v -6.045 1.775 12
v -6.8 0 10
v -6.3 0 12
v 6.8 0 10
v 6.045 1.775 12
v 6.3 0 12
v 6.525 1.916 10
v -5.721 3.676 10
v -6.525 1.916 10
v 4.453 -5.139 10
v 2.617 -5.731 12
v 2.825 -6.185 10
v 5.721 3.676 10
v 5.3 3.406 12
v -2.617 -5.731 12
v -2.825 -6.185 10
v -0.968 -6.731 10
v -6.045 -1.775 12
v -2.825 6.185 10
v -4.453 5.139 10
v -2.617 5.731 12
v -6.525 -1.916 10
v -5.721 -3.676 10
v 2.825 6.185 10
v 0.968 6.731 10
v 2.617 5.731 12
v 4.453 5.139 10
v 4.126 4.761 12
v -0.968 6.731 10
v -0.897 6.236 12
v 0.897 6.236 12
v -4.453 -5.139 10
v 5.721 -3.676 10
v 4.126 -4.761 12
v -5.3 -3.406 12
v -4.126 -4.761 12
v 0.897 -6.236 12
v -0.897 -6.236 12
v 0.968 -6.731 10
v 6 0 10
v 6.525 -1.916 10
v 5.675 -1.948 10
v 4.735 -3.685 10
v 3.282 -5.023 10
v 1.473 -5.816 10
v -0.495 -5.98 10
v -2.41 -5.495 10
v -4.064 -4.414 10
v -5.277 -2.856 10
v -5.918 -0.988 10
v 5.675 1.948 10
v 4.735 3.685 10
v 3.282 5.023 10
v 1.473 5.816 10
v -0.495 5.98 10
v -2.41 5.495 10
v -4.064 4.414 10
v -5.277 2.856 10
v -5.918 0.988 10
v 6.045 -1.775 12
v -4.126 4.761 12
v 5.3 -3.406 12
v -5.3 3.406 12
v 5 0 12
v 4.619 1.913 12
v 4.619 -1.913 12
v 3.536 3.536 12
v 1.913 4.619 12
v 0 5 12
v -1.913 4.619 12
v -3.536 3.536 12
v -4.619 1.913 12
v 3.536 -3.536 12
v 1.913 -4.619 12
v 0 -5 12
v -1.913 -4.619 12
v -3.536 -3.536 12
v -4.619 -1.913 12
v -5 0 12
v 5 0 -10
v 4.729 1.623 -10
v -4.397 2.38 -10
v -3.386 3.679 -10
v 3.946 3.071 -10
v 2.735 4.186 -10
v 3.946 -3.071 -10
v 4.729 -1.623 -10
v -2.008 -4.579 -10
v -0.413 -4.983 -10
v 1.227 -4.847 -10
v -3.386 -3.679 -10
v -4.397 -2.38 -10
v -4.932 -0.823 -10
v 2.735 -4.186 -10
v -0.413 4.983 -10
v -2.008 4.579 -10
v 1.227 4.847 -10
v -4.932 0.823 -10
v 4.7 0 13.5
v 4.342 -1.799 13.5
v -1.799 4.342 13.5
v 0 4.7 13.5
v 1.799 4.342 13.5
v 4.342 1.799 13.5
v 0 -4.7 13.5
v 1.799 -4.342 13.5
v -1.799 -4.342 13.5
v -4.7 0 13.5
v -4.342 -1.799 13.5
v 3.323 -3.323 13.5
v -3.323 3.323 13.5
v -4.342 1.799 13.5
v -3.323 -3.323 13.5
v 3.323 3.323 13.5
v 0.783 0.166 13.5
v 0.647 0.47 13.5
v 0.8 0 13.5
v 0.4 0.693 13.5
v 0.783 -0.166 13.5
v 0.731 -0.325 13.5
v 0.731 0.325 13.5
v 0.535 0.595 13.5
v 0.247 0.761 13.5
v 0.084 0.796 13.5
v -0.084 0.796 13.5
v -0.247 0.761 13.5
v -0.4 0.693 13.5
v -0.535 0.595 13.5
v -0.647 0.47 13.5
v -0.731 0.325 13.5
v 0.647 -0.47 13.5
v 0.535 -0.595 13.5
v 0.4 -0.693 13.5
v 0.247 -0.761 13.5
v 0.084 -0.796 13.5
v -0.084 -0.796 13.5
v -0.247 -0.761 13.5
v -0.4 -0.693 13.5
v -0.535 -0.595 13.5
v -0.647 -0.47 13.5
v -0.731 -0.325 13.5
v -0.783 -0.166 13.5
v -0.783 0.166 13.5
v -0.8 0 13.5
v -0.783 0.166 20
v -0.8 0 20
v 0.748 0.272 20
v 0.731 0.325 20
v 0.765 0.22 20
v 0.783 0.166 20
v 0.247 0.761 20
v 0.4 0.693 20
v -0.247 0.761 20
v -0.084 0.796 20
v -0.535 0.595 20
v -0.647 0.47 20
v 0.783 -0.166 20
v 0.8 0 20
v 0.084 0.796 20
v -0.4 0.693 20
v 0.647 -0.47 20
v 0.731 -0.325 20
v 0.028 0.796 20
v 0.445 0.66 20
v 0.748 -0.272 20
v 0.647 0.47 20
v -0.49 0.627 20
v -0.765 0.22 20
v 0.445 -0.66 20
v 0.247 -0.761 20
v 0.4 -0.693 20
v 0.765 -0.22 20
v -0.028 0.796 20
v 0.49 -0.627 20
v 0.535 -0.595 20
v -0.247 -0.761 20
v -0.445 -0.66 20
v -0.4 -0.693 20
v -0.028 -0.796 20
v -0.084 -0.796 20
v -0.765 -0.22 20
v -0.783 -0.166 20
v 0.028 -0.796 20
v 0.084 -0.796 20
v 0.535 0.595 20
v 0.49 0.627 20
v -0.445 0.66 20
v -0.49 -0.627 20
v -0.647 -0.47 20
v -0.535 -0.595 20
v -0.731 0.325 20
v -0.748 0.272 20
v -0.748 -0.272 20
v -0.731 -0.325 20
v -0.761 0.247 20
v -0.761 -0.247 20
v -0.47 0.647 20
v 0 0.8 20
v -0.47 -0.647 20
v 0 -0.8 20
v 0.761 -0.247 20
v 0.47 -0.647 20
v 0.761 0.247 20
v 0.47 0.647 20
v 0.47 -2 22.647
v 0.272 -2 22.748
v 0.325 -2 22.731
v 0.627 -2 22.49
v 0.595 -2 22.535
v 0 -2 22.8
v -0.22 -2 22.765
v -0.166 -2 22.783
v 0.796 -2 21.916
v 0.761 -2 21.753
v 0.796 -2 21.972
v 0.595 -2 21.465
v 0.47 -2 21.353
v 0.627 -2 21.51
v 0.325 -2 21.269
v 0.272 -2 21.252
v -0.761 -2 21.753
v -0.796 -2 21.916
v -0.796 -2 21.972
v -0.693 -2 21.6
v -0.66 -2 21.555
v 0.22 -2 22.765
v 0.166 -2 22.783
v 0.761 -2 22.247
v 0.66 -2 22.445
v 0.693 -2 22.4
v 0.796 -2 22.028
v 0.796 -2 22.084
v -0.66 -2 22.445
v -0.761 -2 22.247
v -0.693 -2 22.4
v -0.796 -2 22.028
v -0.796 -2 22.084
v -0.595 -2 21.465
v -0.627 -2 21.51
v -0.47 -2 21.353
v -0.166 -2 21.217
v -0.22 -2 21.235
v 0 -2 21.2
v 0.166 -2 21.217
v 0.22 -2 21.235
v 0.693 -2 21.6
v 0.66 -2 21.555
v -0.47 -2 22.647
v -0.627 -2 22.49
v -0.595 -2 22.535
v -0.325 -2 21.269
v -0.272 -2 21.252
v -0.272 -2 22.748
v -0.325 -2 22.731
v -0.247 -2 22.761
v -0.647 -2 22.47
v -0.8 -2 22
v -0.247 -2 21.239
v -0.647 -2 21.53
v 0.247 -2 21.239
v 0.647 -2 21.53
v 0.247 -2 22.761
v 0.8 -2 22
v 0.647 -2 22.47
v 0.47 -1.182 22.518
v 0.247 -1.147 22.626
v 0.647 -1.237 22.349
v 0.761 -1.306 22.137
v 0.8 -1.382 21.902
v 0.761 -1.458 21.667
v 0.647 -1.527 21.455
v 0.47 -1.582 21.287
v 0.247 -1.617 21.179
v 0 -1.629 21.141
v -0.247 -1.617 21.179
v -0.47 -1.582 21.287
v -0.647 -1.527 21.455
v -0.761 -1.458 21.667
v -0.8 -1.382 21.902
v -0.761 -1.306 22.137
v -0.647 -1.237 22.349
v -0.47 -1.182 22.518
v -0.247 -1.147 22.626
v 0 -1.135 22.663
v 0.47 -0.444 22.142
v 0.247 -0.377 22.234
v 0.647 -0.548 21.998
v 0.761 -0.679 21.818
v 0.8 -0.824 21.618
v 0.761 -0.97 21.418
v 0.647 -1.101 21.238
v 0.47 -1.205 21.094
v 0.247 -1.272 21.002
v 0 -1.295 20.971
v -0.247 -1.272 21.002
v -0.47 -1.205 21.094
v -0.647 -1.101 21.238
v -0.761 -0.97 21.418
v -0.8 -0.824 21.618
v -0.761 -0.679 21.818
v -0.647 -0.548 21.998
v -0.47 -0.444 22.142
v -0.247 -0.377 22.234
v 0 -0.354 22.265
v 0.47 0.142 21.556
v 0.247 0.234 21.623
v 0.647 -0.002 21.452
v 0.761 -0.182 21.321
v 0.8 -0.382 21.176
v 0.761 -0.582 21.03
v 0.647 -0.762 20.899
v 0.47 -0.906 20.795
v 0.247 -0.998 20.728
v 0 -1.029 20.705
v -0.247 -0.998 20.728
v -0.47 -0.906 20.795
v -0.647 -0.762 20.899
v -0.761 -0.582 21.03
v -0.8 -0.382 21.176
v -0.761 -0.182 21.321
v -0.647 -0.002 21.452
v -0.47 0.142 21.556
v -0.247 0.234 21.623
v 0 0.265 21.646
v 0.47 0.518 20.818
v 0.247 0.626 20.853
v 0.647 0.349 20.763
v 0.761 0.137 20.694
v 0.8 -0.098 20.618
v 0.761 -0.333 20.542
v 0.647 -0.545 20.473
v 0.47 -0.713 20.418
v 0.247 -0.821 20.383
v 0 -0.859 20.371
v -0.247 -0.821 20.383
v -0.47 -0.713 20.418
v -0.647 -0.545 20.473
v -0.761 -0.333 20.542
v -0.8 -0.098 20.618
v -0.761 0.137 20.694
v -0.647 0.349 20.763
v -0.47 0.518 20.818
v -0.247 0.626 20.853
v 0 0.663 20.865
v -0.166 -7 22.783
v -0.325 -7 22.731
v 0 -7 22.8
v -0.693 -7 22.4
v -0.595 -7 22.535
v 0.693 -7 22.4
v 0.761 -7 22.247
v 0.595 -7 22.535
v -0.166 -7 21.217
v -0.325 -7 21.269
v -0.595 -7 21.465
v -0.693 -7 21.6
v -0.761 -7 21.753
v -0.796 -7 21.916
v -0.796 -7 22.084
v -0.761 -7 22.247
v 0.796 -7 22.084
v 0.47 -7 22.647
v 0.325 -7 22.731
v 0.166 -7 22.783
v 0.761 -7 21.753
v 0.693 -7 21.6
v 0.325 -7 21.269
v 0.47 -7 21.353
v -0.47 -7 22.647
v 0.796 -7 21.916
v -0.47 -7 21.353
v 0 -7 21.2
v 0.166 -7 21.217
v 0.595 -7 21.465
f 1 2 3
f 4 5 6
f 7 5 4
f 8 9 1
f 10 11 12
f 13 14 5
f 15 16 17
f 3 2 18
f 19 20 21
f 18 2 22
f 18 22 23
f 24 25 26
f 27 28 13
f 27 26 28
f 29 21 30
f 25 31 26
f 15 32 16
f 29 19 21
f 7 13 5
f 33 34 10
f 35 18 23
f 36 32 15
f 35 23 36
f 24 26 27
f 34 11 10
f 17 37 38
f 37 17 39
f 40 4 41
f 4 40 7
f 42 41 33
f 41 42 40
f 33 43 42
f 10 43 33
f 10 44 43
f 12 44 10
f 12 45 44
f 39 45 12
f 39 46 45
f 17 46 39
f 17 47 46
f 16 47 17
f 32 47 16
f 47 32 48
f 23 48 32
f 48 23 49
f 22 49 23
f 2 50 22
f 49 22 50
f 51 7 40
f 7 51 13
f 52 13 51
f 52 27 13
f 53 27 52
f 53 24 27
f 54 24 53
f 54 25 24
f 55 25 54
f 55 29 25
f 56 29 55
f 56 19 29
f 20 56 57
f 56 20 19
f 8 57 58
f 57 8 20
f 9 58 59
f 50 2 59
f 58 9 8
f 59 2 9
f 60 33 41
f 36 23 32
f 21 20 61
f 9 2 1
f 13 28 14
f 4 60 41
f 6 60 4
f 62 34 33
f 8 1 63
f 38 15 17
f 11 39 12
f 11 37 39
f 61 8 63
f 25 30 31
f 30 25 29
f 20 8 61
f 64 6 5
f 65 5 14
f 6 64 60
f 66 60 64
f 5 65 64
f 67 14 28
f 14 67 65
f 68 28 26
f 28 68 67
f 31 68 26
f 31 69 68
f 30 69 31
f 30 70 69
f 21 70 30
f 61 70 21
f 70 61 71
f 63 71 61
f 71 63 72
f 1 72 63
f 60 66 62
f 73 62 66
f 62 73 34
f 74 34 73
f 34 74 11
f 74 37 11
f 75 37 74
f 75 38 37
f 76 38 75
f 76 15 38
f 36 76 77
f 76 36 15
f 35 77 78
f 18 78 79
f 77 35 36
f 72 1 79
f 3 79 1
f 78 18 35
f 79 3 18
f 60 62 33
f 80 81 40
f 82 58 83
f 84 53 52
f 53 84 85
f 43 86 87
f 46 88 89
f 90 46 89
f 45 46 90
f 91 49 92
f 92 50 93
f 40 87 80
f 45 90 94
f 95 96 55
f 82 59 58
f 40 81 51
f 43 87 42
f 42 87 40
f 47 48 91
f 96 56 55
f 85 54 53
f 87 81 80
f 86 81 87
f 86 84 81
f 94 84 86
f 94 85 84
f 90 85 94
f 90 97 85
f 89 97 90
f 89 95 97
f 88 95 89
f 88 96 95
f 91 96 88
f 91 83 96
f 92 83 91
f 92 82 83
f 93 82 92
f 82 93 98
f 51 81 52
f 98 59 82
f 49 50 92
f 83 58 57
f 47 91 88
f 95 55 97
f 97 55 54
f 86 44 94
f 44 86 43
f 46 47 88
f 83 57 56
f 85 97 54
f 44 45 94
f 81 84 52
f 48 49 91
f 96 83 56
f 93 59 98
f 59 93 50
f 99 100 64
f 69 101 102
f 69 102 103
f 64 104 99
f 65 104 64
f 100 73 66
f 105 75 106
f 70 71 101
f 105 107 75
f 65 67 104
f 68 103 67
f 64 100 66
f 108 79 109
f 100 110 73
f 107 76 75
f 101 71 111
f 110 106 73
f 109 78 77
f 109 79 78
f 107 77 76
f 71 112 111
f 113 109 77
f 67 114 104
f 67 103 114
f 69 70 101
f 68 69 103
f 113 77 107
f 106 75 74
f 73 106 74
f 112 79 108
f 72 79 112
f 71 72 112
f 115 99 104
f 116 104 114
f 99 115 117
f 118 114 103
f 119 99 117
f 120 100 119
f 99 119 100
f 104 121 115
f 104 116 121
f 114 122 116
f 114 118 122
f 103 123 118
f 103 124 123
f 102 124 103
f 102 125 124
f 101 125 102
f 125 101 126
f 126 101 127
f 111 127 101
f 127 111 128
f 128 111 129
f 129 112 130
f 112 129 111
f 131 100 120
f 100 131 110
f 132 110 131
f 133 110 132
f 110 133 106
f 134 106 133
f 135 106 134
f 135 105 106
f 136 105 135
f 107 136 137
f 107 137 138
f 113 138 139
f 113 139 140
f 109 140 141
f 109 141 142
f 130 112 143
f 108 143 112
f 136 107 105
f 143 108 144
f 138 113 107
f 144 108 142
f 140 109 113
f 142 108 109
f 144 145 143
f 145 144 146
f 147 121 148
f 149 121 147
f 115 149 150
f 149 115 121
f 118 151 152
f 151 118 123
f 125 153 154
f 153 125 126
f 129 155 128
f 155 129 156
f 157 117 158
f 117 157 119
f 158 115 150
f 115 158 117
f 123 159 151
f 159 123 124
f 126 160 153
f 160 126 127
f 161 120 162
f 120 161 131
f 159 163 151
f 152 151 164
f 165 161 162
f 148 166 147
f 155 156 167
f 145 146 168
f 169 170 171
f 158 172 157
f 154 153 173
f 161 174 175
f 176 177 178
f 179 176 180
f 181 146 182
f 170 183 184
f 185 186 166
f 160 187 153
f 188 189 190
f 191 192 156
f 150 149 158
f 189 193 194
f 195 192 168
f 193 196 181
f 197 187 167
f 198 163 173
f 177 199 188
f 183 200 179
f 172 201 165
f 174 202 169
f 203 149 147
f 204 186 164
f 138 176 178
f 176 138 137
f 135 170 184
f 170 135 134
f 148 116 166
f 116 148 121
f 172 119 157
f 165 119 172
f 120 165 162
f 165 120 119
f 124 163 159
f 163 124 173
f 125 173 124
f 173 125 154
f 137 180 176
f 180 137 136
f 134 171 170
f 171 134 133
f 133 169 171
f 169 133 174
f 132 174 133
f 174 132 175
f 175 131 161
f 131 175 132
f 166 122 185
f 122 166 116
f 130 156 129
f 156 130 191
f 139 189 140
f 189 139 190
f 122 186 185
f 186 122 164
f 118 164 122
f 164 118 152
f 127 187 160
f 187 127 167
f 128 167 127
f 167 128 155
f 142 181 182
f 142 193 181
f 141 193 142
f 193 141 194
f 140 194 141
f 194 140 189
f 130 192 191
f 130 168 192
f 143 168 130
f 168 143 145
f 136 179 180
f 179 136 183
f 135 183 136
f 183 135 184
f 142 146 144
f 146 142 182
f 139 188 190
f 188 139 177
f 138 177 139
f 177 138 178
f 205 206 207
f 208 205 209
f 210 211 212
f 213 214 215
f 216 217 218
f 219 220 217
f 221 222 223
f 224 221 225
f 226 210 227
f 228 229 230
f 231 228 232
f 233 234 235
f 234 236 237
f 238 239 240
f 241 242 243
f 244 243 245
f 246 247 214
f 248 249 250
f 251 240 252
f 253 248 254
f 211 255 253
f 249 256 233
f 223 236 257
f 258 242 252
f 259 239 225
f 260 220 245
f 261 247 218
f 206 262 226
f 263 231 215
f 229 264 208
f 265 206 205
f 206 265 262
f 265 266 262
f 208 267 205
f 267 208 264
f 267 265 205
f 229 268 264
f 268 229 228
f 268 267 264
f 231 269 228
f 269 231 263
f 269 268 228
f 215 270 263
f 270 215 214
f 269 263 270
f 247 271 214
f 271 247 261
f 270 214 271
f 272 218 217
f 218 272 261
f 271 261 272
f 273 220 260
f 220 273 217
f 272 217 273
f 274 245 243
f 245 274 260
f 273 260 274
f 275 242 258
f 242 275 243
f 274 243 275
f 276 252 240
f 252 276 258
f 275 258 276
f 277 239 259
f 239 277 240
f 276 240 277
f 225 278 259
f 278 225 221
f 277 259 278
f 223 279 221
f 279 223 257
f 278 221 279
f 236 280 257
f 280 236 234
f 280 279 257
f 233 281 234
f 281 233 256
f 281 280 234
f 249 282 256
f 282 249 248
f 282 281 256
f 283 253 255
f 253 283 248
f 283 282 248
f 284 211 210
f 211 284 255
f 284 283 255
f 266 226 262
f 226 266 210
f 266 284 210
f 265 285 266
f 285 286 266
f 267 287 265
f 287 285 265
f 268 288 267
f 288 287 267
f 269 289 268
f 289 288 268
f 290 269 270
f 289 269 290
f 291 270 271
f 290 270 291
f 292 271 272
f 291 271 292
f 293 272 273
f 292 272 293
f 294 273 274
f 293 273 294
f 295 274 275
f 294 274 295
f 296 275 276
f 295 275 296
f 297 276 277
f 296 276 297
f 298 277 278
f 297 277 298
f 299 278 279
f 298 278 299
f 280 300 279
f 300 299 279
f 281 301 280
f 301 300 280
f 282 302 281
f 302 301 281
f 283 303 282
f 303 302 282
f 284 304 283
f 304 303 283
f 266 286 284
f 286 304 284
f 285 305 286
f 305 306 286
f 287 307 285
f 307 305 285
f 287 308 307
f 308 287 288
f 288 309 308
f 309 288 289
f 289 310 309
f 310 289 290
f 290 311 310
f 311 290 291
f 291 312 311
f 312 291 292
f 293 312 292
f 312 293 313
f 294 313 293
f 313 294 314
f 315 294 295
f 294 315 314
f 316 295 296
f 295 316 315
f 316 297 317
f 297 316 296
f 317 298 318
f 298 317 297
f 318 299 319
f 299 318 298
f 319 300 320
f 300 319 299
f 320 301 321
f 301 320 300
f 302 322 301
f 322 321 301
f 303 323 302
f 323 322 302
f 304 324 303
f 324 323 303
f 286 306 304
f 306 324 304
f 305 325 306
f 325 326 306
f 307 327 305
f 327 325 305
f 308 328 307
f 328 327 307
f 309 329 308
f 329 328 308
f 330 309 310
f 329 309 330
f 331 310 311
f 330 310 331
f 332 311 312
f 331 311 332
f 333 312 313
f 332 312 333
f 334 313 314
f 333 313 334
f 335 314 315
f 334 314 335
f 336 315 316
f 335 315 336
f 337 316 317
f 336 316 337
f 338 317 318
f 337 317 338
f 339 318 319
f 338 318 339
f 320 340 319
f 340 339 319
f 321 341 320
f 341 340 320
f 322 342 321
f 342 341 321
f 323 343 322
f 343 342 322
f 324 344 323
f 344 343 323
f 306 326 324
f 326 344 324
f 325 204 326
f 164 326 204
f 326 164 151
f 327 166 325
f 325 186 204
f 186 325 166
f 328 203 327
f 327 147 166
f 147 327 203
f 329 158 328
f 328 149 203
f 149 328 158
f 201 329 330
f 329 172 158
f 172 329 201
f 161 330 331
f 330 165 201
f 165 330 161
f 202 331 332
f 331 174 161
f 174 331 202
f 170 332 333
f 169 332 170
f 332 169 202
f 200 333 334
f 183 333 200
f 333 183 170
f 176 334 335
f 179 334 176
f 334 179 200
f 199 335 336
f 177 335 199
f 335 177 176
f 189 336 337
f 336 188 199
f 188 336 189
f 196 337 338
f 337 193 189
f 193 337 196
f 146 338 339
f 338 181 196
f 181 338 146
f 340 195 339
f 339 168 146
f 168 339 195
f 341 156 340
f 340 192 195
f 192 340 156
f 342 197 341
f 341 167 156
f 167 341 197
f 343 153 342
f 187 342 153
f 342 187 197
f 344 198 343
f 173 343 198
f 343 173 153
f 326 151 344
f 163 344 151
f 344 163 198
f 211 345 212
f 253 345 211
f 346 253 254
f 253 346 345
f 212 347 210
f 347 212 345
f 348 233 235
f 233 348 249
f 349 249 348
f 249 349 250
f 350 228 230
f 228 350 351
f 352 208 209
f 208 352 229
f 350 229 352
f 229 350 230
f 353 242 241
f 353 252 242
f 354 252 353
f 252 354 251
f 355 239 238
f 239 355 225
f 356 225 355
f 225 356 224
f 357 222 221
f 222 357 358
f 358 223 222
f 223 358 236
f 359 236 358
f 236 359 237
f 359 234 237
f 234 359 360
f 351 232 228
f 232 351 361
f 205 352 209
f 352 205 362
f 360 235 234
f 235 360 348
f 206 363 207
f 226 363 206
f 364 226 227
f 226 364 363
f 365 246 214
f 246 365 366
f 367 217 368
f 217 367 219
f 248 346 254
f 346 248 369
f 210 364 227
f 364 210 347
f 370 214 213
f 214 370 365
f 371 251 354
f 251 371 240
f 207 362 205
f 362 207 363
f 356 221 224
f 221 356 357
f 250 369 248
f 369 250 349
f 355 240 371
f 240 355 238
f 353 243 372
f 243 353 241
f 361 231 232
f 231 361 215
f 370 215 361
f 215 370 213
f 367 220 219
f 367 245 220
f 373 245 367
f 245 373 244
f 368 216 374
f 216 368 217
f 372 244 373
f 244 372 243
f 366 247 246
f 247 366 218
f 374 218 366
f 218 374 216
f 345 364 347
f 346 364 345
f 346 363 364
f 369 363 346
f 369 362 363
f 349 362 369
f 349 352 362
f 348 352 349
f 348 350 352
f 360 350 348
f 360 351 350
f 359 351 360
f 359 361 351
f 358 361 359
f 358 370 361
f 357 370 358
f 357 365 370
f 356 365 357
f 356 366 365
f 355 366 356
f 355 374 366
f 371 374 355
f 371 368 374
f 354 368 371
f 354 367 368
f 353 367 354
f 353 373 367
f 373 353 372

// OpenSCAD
module Soda_Cup_01(){

    color("white"){
    translate([0,0,10])
    cylinder(2,6.8,6.3);
    }

    color("#dbceb2"){
    cylinder(20,5,6, center = true);
    }

    color("white"){
    translate([0,0,12])
    cylinder(1.5,5,4.7);
    }

    color("black"){
    translate([0,0,12])
    cylinder(8,0.8,0.8, $fn = 30);
    }

    translate([0,-2, 20])
    rotate([0,-90,0])
    color("black")
    rotate_extrude(angle = 90, $fn = 20){
    translate([2, 0, 0])
    circle(r = 0.8 ,$fn = 20);
    }

    rotate([0,-90,90])
    color("black"){
    translate([22,0,2])
    cylinder(5,0.8,0.8, $fn = 30);
    }

}

Soda_Cup_01();

// Written by Nicolì Angelo (Gengio) 2024: 
// MIT License

//Permission is hereby granted, free of charge, to any person obtaining a copy of this software and associated documentation files (the "Software"), to deal in the Software without restriction, including without limitation the rights to use, copy, modify, merge, publish, distribute, sublicense, and/or sell copies of the Software, and to permit persons to whom the Software is furnished to do so, subject to the following conditions:

//The above copyright notice and this permission notice shall be included in all copies or substantial portions of the Software.

//THE SOFTWARE IS PROVIDED "AS IS", WITHOUT WARRANTY OF ANY KIND, EXPRESS OR IMPLIED, INCLUDING BUT NOT LIMITED TO THE WARRANTIES OF MERCHANTABILITY, FITNESS FOR A PARTICULAR PURPOSE AND NONINFRINGEMENT. IN NO EVENT SHALL THE AUTHORS OR COPYRIGHT HOLDERS BE LIABLE FOR ANY CLAIM, DAMAGES OR OTHER LIABILITY, WHETHER IN AN ACTION OF CONTRACT, TORT OR OTHERWISE, ARISING FROM, OUT OF OR IN CONNECTION WITH THE SOFTWARE OR THE USE OR OTHER DEALINGS IN THE SOFTWARE.
